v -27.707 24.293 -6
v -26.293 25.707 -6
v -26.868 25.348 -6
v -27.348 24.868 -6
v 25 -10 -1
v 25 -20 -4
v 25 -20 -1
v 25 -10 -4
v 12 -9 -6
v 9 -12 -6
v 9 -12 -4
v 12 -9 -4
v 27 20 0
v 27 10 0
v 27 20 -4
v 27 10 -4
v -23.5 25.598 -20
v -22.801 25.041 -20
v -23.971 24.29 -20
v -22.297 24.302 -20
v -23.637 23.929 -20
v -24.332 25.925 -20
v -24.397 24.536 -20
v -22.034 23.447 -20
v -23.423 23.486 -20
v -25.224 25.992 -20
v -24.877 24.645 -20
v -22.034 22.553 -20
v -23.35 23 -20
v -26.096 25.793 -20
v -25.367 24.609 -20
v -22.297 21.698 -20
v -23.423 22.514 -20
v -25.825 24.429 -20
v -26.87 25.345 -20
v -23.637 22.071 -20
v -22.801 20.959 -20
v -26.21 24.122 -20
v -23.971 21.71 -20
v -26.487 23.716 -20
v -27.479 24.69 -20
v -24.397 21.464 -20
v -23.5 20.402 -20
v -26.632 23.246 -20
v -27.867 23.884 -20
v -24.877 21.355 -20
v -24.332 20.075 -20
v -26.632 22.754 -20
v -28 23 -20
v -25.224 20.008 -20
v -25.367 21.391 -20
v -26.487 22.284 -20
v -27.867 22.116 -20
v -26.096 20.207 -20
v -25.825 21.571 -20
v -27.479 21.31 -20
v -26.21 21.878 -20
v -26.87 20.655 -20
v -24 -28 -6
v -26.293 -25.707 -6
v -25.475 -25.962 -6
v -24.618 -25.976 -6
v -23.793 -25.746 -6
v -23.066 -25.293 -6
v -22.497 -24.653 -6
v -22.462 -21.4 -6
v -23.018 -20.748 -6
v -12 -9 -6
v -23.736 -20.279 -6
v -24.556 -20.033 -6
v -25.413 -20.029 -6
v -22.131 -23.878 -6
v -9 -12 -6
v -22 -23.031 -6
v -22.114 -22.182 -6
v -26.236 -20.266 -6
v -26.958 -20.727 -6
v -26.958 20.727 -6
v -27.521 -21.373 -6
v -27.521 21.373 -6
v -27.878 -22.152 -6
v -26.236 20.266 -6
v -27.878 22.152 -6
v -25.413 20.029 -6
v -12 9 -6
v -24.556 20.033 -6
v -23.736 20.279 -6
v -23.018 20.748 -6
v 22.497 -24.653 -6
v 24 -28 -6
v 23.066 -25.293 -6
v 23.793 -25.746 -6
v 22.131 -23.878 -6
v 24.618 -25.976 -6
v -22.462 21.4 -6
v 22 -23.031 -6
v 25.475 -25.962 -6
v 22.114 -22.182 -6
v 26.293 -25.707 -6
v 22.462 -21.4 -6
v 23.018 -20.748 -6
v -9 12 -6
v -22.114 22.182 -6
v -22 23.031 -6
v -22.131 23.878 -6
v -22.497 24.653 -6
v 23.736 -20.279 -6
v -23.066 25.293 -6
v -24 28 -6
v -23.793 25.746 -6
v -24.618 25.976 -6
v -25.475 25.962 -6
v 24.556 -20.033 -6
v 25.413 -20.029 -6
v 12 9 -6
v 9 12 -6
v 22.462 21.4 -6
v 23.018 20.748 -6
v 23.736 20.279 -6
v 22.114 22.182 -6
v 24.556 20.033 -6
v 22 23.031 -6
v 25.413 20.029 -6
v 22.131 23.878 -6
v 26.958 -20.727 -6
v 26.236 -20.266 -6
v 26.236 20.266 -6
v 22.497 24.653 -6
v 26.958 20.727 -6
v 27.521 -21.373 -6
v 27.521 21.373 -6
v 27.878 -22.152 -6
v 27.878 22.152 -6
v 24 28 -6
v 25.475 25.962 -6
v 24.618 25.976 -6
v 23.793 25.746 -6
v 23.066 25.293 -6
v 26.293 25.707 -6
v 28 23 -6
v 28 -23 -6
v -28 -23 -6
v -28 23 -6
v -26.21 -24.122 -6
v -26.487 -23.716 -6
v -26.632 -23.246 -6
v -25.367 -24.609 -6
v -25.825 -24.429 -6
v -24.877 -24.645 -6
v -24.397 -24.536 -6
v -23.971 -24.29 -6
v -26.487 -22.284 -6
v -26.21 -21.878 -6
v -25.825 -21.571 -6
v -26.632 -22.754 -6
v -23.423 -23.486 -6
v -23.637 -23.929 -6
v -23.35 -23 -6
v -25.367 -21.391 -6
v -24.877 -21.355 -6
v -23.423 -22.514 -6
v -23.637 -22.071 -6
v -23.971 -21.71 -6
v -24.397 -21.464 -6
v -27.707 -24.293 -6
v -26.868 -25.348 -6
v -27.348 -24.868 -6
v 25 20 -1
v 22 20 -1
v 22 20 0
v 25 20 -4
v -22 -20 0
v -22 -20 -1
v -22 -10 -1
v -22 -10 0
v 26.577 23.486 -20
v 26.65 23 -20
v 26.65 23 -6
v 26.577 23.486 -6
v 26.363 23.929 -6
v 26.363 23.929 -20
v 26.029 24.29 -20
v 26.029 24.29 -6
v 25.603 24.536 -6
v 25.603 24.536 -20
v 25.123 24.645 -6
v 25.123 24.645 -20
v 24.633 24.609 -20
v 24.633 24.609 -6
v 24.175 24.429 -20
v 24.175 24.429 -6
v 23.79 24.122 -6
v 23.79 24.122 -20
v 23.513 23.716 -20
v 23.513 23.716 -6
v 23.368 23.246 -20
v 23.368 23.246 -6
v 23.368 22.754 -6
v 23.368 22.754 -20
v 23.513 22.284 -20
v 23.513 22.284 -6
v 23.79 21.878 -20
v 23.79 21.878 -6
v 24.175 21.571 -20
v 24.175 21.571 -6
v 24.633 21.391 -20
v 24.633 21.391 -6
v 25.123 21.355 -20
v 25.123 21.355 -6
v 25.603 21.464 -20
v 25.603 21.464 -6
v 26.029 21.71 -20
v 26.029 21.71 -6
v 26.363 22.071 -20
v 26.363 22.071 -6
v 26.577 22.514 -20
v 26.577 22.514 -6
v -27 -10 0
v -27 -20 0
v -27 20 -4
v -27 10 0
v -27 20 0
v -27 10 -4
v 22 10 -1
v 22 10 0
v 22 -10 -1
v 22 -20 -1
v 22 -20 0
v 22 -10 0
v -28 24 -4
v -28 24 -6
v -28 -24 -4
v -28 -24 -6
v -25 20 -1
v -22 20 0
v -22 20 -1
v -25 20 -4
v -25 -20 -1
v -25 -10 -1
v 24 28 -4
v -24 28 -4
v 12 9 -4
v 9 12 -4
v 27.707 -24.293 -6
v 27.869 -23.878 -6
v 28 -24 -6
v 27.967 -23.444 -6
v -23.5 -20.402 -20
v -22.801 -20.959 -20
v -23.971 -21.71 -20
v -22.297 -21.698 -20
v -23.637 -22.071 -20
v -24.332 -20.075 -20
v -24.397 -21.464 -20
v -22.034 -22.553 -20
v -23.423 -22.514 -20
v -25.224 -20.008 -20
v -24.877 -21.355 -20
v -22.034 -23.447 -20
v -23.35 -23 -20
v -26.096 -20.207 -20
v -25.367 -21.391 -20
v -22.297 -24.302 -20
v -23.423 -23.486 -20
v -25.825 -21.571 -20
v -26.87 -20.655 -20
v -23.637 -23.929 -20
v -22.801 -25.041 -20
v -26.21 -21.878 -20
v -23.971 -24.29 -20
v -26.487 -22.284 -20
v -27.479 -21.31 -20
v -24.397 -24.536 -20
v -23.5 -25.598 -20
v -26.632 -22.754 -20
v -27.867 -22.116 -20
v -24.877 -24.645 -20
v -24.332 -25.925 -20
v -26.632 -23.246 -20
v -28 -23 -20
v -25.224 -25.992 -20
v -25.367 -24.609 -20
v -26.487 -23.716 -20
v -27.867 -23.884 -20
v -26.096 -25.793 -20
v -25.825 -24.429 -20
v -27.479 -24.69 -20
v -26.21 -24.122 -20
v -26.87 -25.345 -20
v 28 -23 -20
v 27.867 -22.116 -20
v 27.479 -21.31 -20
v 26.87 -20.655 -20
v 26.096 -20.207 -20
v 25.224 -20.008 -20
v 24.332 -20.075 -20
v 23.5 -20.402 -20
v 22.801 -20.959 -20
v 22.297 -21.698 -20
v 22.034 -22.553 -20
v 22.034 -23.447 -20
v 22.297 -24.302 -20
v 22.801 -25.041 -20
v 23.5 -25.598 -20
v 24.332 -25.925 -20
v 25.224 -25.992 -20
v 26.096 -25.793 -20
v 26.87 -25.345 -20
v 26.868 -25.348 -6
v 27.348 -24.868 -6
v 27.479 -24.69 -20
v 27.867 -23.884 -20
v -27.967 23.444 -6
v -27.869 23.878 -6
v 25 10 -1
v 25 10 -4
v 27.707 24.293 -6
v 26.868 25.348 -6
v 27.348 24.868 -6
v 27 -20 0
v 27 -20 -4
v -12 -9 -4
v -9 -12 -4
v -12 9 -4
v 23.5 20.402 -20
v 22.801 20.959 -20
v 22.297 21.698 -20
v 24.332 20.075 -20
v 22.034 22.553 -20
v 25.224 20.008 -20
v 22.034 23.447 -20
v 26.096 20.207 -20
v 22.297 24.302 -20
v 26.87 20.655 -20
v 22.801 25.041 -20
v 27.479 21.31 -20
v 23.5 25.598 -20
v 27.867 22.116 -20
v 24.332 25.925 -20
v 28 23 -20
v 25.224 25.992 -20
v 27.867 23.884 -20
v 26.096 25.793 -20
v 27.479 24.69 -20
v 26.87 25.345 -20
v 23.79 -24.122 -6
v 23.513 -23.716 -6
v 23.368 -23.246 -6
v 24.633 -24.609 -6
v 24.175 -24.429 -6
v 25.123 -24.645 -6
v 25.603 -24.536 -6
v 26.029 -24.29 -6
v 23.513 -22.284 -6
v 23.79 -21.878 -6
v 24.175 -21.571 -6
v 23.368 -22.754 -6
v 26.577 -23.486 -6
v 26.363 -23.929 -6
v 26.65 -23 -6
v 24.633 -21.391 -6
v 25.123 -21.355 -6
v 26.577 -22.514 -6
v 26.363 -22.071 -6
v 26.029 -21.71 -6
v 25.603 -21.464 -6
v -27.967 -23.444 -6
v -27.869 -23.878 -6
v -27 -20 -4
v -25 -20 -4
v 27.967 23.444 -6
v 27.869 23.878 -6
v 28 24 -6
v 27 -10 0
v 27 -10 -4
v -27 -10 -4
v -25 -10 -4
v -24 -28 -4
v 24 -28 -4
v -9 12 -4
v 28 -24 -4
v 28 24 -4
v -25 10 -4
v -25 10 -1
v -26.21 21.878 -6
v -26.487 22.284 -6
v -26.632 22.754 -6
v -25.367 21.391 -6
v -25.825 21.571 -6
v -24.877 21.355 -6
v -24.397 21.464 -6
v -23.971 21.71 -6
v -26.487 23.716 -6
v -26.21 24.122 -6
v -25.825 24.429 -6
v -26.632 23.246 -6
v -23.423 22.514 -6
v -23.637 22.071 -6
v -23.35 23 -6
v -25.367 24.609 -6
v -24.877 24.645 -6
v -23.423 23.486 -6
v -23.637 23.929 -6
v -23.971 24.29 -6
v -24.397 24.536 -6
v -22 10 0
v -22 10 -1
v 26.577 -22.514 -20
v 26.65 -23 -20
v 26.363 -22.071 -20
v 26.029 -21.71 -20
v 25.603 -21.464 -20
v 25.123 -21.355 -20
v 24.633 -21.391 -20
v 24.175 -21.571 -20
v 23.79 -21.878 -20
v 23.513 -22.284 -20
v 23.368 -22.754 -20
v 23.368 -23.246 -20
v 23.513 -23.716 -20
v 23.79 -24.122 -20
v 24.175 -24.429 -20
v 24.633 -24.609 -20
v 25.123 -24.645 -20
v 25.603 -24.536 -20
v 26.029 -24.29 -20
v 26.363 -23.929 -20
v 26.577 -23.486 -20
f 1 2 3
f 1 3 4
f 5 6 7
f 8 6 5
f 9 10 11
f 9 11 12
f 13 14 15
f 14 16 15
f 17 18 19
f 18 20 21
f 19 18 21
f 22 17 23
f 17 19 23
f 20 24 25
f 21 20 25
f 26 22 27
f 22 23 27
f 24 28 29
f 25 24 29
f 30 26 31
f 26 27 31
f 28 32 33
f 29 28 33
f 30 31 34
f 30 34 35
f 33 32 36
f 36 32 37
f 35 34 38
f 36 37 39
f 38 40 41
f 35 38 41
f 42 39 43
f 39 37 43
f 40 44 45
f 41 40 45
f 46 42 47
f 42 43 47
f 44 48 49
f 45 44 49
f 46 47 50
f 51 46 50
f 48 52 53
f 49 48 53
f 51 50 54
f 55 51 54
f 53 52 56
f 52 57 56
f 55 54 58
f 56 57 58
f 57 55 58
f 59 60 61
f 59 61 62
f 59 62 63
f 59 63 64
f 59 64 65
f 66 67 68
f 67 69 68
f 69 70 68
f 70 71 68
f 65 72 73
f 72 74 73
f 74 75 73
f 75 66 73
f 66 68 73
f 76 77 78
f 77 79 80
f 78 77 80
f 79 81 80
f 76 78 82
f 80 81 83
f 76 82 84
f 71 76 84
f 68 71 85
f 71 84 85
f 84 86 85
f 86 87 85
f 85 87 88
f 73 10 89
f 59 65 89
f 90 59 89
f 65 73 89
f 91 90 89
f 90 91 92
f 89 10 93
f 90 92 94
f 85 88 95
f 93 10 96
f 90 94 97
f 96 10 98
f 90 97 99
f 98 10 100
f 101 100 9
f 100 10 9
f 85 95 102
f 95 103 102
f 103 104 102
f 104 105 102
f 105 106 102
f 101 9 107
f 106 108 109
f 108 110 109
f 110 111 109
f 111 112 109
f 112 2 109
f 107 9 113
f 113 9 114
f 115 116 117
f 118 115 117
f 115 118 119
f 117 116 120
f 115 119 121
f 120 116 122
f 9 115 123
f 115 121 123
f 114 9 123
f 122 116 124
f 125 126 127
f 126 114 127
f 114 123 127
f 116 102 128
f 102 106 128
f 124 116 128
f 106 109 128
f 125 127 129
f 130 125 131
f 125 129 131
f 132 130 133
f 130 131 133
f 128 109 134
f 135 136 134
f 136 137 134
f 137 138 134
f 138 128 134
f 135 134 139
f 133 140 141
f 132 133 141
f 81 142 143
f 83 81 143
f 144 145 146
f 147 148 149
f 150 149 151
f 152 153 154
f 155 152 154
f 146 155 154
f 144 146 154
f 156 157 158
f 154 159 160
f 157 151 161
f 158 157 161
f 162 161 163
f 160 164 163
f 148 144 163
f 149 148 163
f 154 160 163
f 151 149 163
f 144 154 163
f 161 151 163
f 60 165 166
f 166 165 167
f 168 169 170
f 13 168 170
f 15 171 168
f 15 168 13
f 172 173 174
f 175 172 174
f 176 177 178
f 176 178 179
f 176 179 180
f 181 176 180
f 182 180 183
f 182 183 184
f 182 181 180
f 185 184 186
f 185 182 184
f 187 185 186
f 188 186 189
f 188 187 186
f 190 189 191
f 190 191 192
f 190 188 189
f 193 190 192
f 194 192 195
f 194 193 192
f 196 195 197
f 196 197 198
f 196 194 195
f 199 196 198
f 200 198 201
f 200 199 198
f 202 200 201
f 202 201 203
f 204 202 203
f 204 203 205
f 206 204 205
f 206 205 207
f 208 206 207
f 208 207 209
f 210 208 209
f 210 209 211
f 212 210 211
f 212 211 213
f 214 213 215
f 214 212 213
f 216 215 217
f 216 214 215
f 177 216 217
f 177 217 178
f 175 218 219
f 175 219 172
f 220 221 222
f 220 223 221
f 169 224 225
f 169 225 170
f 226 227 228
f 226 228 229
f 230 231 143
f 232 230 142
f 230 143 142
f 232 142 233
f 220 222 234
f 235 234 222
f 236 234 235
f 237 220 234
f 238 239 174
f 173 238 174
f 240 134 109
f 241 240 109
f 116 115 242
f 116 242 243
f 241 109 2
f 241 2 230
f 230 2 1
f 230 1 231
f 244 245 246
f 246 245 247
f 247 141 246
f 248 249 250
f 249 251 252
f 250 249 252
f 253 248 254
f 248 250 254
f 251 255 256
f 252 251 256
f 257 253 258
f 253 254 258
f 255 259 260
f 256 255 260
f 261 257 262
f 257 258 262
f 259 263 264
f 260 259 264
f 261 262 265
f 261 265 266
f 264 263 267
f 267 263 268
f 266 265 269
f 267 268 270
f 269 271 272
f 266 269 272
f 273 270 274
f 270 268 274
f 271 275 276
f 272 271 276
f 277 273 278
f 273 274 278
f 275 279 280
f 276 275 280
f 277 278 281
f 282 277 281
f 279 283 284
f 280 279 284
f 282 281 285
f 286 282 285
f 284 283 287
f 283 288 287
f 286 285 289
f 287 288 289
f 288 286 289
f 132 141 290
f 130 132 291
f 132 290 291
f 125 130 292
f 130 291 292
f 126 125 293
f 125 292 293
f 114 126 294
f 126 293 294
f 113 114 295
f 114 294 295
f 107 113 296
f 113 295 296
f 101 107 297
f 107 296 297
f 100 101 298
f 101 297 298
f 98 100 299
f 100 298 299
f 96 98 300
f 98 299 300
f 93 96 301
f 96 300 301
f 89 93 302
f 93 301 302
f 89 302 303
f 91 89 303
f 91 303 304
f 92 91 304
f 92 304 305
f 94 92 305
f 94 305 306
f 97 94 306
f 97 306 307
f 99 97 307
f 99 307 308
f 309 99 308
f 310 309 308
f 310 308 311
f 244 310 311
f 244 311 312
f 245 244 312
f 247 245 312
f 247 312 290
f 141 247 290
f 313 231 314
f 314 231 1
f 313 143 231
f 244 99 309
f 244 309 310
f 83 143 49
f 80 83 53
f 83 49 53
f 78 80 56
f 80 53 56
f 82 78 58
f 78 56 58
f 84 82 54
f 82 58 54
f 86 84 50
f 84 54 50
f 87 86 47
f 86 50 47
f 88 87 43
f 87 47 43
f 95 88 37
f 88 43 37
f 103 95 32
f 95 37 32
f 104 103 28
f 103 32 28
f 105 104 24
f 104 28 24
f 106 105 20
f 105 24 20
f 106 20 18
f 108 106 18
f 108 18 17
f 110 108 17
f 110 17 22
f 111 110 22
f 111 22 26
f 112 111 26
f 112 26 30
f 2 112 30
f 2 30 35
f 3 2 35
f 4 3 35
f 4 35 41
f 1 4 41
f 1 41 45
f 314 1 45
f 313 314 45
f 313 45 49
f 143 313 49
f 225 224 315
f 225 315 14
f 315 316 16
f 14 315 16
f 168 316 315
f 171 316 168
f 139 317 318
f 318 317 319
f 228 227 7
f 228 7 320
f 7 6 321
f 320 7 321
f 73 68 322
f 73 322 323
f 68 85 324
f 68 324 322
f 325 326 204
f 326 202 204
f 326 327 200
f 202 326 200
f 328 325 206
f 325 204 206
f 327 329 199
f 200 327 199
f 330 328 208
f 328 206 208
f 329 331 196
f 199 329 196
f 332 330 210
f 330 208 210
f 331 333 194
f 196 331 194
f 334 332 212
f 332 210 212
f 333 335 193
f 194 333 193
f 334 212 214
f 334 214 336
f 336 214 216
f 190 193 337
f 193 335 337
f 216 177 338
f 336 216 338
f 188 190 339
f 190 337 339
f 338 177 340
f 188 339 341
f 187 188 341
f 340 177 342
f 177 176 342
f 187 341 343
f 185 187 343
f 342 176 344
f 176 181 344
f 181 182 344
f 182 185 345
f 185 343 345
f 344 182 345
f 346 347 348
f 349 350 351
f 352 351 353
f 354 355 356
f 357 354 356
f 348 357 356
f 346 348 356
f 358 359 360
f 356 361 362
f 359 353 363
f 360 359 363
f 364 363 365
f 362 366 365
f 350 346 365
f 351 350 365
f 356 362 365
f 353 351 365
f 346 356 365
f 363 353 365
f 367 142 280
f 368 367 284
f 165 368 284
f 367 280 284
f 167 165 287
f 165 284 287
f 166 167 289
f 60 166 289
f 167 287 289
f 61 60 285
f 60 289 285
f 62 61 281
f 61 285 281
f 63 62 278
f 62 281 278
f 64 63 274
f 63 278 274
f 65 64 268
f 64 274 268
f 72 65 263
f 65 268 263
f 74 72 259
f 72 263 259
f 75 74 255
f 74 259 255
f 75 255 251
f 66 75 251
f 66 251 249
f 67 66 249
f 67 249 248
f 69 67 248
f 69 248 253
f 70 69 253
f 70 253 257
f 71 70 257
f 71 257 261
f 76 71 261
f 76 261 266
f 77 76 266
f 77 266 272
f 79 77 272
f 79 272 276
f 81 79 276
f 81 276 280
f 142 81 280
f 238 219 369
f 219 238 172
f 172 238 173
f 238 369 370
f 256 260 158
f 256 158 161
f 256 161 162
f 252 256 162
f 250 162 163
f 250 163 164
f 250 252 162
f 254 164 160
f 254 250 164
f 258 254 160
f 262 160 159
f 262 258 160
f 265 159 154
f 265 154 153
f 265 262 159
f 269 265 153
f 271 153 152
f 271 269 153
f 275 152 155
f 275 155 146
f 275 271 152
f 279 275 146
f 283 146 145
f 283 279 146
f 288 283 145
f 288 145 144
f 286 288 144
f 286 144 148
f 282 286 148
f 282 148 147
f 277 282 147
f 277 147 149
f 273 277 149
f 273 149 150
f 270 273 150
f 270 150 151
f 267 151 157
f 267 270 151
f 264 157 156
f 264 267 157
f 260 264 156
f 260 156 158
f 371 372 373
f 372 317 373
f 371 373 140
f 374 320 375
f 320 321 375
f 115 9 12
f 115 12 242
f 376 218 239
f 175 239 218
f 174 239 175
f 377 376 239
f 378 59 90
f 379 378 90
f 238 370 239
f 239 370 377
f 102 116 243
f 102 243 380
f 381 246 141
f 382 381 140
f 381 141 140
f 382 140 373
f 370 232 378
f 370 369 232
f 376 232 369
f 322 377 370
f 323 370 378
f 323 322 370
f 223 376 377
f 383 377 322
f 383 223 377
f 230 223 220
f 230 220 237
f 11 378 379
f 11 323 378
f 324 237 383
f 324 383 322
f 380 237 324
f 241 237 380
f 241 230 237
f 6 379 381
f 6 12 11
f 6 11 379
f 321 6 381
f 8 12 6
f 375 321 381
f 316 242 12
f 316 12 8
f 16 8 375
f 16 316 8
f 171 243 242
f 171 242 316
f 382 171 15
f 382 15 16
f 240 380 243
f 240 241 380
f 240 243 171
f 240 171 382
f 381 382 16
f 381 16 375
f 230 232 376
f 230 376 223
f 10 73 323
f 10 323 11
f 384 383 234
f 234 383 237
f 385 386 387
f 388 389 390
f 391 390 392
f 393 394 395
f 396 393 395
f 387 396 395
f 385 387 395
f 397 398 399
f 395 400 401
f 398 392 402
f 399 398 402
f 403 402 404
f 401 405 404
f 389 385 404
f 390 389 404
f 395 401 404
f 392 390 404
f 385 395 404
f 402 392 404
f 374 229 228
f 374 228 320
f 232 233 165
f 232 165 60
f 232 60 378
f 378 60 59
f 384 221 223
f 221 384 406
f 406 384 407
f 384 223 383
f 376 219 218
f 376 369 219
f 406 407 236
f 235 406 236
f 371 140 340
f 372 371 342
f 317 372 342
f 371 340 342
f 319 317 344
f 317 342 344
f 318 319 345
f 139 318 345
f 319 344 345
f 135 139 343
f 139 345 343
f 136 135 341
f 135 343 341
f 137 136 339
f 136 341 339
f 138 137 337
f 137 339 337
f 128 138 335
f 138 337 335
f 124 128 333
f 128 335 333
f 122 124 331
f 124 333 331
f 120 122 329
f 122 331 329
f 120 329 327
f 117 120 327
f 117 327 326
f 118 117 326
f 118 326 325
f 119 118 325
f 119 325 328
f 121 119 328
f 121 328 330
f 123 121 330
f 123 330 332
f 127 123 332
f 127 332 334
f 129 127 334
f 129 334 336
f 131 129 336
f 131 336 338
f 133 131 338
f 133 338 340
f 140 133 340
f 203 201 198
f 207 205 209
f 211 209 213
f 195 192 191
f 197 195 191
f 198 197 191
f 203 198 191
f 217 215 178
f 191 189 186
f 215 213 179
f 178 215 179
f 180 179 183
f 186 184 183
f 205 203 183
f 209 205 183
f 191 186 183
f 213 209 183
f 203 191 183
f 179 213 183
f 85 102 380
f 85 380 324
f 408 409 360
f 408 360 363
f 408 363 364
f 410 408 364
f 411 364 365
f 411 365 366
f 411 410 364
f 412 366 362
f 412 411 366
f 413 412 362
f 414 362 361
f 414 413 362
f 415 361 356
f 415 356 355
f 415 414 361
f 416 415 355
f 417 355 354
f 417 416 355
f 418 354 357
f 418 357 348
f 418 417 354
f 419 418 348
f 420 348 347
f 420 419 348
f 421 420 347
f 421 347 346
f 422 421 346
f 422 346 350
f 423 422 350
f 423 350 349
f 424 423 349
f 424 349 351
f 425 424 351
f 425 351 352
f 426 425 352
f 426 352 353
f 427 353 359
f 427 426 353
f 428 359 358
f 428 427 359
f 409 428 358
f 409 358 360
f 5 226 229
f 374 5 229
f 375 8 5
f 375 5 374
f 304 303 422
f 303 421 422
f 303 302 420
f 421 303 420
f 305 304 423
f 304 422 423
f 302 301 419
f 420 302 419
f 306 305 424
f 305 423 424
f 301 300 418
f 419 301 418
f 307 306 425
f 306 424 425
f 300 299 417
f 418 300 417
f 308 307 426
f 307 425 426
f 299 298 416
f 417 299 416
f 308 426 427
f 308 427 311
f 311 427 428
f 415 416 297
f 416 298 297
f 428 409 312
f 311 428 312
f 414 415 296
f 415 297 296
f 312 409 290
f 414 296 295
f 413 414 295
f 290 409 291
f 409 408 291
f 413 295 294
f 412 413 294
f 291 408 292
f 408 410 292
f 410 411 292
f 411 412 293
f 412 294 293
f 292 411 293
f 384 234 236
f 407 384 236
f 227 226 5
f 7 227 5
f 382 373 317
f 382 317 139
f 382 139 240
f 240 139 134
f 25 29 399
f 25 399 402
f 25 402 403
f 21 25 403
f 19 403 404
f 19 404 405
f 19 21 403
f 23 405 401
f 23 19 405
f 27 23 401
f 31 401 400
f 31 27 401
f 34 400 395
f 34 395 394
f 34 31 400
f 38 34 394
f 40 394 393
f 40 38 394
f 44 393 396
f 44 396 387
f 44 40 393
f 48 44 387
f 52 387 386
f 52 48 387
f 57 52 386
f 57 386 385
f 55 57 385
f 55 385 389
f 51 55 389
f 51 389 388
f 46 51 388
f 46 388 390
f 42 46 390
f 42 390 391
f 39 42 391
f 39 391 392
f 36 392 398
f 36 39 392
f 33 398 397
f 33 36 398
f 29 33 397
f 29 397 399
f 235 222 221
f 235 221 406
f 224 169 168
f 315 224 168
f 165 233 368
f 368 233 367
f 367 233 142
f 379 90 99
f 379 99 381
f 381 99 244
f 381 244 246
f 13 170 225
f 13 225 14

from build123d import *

# Parameters (mm, degrees)
EXTRUDE_START              = -6
EXTRUDE_275_DEPTH          = 2
EXTRUDE_START_2            = -20
SKETCH_2_R                 = 3
EXTRUDE_1_1_DEPTH          = 14
CUT_EXTRUDE_START          = -20
SKETCH_3_R                 = 1.65
CUT_EXTRUDE_M3_1_1_DEPTH   = 14
EXTRUDE_START_3            = -4
SKETCH_4_W                 = 2
SKETCH_4_H                 = 10
EXTRUDE_1_1_2_DEPTH        = 3
EXTRUDE_START_4            = -1
SKETCH_5_W                 = 5
SKETCH_5_H                 = 10
EXTRUDE_1_1_3_DEPTH        = 1
SKETCH_6_R                 = 3
EXTRUDE_1_1_4_DEPTH        = 14
SKETCH_7_R                 = 1.65
CUT_EXTRUDE_M3_1_1_2_DEPTH = 14
SKETCH_8_W                 = 2
SKETCH_8_H                 = 10
EXTRUDE_1_1_5_DEPTH        = 3
SKETCH_9_W                 = 5
SKETCH_9_H                 = 10
EXTRUDE_1_1_6_DEPTH        = 1
SKETCH_10_R                = 3
EXTRUDE_1_1_7_DEPTH        = 14
SKETCH_11_R                = 1.65
CUT_EXTRUDE_M3_1_1_3_DEPTH = 14
SKETCH_12_W                = 2
SKETCH_12_H                = 10
EXTRUDE_1_1_8_DEPTH        = 3
SKETCH_13_W                = 5
SKETCH_13_H                = 10
EXTRUDE_1_1_9_DEPTH        = 1
SKETCH_14_R                = 3
EXTRUDE_1_1_10_DEPTH       = 14
SKETCH_15_R                = 1.65
CUT_EXTRUDE_M3_1_1_4_DEPTH = 14
SKETCH_16_W                = 2
SKETCH_16_H                = 10
EXTRUDE_1_1_11_DEPTH       = 3
SKETCH_17_W                = 5
SKETCH_17_H                = 10
EXTRUDE_1_1_12_DEPTH       = 1


with BuildPart() as part:
    # 草图1 → Extrude 275 (new body)
    with BuildSketch(Plane.XY.offset(EXTRUDE_START)):
        Polygon((-24, -28), (24, -28), (28, -24), (28, 24), (24, 28), (-24, 28), (-28, 24), (-28, -24), align=None)
        Polygon((-9, -12), (9, -12), (12, -9), (12, 9), (9, 12), (-9, 12), (-12, 9), (-12, -9), align=None, mode=Mode.SUBTRACT)
    extrude(amount=EXTRUDE_275_DEPTH)

    # 草图2 → Extrude 1_-1 (add)
    with BuildSketch(Plane.XY.offset(EXTRUDE_START_2)):
        with Locations(Location((-25, -23, 0), (0, 0, 180))):
            Circle(SKETCH_2_R)
    extrude(amount=EXTRUDE_1_1_DEPTH)

    # 草图3 → Cut-Extrude M3__-1_-1 (cut)
    with BuildSketch(Plane.XY.offset(CUT_EXTRUDE_START)):
        with Locations((-25, -23)):
            Circle(SKETCH_3_R)
    extrude(amount=CUT_EXTRUDE_M3_1_1_DEPTH, mode=Mode.SUBTRACT)

    # 草图4 → Extrude 1_-1 2 (add)
    with BuildSketch(Plane.XY.offset(EXTRUDE_START_3)):
        with Locations((-26, -15)):
            Rectangle(SKETCH_4_W, SKETCH_4_H)
    extrude(amount=EXTRUDE_1_1_2_DEPTH)

    # 草图5 → Extrude 1_-1 3 (add)
    with BuildSketch(Plane.XY.offset(EXTRUDE_START_4)):
        with Locations((-24.5, -15)):
            Rectangle(SKETCH_5_W, SKETCH_5_H)
    extrude(amount=EXTRUDE_1_1_3_DEPTH)

    # 草图6 → Extrude 1_1 4 (add)
    with BuildSketch(Plane.XY.offset(EXTRUDE_START_2)):
        with Locations(Location((-25, 23, 0), (0, 0, 180))):
            Circle(SKETCH_6_R)
    extrude(amount=EXTRUDE_1_1_4_DEPTH)

    # 草图7 → Cut-Extrude M3__-1_1 2 (cut)
    with BuildSketch(Plane.XY.offset(CUT_EXTRUDE_START)):
        with Locations((-25, 23)):
            Circle(SKETCH_7_R)
    extrude(amount=CUT_EXTRUDE_M3_1_1_2_DEPTH, mode=Mode.SUBTRACT)

    # 草图8 → Extrude 1_1 5 (add)
    with BuildSketch(Plane.XY.offset(EXTRUDE_START_3)):
        with Locations((-26, 15)):
            Rectangle(SKETCH_8_W, SKETCH_8_H)
    extrude(amount=EXTRUDE_1_1_5_DEPTH)

    # 草图9 → Extrude 1_1 6 (add)
    with BuildSketch(Plane.XY.offset(EXTRUDE_START_4)):
        with Locations((-24.5, 15)):
            Rectangle(SKETCH_9_W, SKETCH_9_H)
    extrude(amount=EXTRUDE_1_1_6_DEPTH)

    # 草图10 → Extrude 1_-1 7 (add)
    with BuildSketch(Plane.XY.offset(EXTRUDE_START_2)):
        with Locations((25, -23)):
            Circle(SKETCH_10_R)
    extrude(amount=EXTRUDE_1_1_7_DEPTH)

    # 草图11 → Cut-Extrude M3__1_-1 3 (cut)
    with BuildSketch(Plane.XY.offset(CUT_EXTRUDE_START)):
        with Locations((25, -23)):
            Circle(SKETCH_11_R)
    extrude(amount=CUT_EXTRUDE_M3_1_1_3_DEPTH, mode=Mode.SUBTRACT)

    # 草图12 → Extrude 1_-1 8 (add)
    with BuildSketch(Plane.XY.offset(EXTRUDE_START_3)):
        with Locations((26, -15)):
            Rectangle(SKETCH_12_W, SKETCH_12_H)
    extrude(amount=EXTRUDE_1_1_8_DEPTH)

    # 草图13 → Extrude 1_-1 9 (add)
    with BuildSketch(Plane.XY.offset(EXTRUDE_START_4)):
        with Locations((24.5, -15)):
            Rectangle(SKETCH_13_W, SKETCH_13_H)
    extrude(amount=EXTRUDE_1_1_9_DEPTH)

    # 草图14 → Extrude 1_1 10 (add)
    with BuildSketch(Plane.XY.offset(EXTRUDE_START_2)):
        with Locations((25, 23)):
            Circle(SKETCH_14_R)
    extrude(amount=EXTRUDE_1_1_10_DEPTH)

    # 草图15 → Cut-Extrude M3__1_1 4 (cut)
    with BuildSketch(Plane.XY.offset(CUT_EXTRUDE_START)):
        with Locations((25, 23)):
            Circle(SKETCH_15_R)
    extrude(amount=CUT_EXTRUDE_M3_1_1_4_DEPTH, mode=Mode.SUBTRACT)

    # 草图16 → Extrude 1_1 11 (add)
    with BuildSketch(Plane.XY.offset(EXTRUDE_START_3)):
        with Locations((26, 15)):
            Rectangle(SKETCH_16_W, SKETCH_16_H)
    extrude(amount=EXTRUDE_1_1_11_DEPTH)

    # 草图17 → Extrude 1_1 12 (add)
    with BuildSketch(Plane.XY.offset(EXTRUDE_START_4)):
        with Locations((24.5, 15)):
            Rectangle(SKETCH_17_W, SKETCH_17_H)
    extrude(amount=EXTRUDE_1_1_12_DEPTH)


solid = part.part
